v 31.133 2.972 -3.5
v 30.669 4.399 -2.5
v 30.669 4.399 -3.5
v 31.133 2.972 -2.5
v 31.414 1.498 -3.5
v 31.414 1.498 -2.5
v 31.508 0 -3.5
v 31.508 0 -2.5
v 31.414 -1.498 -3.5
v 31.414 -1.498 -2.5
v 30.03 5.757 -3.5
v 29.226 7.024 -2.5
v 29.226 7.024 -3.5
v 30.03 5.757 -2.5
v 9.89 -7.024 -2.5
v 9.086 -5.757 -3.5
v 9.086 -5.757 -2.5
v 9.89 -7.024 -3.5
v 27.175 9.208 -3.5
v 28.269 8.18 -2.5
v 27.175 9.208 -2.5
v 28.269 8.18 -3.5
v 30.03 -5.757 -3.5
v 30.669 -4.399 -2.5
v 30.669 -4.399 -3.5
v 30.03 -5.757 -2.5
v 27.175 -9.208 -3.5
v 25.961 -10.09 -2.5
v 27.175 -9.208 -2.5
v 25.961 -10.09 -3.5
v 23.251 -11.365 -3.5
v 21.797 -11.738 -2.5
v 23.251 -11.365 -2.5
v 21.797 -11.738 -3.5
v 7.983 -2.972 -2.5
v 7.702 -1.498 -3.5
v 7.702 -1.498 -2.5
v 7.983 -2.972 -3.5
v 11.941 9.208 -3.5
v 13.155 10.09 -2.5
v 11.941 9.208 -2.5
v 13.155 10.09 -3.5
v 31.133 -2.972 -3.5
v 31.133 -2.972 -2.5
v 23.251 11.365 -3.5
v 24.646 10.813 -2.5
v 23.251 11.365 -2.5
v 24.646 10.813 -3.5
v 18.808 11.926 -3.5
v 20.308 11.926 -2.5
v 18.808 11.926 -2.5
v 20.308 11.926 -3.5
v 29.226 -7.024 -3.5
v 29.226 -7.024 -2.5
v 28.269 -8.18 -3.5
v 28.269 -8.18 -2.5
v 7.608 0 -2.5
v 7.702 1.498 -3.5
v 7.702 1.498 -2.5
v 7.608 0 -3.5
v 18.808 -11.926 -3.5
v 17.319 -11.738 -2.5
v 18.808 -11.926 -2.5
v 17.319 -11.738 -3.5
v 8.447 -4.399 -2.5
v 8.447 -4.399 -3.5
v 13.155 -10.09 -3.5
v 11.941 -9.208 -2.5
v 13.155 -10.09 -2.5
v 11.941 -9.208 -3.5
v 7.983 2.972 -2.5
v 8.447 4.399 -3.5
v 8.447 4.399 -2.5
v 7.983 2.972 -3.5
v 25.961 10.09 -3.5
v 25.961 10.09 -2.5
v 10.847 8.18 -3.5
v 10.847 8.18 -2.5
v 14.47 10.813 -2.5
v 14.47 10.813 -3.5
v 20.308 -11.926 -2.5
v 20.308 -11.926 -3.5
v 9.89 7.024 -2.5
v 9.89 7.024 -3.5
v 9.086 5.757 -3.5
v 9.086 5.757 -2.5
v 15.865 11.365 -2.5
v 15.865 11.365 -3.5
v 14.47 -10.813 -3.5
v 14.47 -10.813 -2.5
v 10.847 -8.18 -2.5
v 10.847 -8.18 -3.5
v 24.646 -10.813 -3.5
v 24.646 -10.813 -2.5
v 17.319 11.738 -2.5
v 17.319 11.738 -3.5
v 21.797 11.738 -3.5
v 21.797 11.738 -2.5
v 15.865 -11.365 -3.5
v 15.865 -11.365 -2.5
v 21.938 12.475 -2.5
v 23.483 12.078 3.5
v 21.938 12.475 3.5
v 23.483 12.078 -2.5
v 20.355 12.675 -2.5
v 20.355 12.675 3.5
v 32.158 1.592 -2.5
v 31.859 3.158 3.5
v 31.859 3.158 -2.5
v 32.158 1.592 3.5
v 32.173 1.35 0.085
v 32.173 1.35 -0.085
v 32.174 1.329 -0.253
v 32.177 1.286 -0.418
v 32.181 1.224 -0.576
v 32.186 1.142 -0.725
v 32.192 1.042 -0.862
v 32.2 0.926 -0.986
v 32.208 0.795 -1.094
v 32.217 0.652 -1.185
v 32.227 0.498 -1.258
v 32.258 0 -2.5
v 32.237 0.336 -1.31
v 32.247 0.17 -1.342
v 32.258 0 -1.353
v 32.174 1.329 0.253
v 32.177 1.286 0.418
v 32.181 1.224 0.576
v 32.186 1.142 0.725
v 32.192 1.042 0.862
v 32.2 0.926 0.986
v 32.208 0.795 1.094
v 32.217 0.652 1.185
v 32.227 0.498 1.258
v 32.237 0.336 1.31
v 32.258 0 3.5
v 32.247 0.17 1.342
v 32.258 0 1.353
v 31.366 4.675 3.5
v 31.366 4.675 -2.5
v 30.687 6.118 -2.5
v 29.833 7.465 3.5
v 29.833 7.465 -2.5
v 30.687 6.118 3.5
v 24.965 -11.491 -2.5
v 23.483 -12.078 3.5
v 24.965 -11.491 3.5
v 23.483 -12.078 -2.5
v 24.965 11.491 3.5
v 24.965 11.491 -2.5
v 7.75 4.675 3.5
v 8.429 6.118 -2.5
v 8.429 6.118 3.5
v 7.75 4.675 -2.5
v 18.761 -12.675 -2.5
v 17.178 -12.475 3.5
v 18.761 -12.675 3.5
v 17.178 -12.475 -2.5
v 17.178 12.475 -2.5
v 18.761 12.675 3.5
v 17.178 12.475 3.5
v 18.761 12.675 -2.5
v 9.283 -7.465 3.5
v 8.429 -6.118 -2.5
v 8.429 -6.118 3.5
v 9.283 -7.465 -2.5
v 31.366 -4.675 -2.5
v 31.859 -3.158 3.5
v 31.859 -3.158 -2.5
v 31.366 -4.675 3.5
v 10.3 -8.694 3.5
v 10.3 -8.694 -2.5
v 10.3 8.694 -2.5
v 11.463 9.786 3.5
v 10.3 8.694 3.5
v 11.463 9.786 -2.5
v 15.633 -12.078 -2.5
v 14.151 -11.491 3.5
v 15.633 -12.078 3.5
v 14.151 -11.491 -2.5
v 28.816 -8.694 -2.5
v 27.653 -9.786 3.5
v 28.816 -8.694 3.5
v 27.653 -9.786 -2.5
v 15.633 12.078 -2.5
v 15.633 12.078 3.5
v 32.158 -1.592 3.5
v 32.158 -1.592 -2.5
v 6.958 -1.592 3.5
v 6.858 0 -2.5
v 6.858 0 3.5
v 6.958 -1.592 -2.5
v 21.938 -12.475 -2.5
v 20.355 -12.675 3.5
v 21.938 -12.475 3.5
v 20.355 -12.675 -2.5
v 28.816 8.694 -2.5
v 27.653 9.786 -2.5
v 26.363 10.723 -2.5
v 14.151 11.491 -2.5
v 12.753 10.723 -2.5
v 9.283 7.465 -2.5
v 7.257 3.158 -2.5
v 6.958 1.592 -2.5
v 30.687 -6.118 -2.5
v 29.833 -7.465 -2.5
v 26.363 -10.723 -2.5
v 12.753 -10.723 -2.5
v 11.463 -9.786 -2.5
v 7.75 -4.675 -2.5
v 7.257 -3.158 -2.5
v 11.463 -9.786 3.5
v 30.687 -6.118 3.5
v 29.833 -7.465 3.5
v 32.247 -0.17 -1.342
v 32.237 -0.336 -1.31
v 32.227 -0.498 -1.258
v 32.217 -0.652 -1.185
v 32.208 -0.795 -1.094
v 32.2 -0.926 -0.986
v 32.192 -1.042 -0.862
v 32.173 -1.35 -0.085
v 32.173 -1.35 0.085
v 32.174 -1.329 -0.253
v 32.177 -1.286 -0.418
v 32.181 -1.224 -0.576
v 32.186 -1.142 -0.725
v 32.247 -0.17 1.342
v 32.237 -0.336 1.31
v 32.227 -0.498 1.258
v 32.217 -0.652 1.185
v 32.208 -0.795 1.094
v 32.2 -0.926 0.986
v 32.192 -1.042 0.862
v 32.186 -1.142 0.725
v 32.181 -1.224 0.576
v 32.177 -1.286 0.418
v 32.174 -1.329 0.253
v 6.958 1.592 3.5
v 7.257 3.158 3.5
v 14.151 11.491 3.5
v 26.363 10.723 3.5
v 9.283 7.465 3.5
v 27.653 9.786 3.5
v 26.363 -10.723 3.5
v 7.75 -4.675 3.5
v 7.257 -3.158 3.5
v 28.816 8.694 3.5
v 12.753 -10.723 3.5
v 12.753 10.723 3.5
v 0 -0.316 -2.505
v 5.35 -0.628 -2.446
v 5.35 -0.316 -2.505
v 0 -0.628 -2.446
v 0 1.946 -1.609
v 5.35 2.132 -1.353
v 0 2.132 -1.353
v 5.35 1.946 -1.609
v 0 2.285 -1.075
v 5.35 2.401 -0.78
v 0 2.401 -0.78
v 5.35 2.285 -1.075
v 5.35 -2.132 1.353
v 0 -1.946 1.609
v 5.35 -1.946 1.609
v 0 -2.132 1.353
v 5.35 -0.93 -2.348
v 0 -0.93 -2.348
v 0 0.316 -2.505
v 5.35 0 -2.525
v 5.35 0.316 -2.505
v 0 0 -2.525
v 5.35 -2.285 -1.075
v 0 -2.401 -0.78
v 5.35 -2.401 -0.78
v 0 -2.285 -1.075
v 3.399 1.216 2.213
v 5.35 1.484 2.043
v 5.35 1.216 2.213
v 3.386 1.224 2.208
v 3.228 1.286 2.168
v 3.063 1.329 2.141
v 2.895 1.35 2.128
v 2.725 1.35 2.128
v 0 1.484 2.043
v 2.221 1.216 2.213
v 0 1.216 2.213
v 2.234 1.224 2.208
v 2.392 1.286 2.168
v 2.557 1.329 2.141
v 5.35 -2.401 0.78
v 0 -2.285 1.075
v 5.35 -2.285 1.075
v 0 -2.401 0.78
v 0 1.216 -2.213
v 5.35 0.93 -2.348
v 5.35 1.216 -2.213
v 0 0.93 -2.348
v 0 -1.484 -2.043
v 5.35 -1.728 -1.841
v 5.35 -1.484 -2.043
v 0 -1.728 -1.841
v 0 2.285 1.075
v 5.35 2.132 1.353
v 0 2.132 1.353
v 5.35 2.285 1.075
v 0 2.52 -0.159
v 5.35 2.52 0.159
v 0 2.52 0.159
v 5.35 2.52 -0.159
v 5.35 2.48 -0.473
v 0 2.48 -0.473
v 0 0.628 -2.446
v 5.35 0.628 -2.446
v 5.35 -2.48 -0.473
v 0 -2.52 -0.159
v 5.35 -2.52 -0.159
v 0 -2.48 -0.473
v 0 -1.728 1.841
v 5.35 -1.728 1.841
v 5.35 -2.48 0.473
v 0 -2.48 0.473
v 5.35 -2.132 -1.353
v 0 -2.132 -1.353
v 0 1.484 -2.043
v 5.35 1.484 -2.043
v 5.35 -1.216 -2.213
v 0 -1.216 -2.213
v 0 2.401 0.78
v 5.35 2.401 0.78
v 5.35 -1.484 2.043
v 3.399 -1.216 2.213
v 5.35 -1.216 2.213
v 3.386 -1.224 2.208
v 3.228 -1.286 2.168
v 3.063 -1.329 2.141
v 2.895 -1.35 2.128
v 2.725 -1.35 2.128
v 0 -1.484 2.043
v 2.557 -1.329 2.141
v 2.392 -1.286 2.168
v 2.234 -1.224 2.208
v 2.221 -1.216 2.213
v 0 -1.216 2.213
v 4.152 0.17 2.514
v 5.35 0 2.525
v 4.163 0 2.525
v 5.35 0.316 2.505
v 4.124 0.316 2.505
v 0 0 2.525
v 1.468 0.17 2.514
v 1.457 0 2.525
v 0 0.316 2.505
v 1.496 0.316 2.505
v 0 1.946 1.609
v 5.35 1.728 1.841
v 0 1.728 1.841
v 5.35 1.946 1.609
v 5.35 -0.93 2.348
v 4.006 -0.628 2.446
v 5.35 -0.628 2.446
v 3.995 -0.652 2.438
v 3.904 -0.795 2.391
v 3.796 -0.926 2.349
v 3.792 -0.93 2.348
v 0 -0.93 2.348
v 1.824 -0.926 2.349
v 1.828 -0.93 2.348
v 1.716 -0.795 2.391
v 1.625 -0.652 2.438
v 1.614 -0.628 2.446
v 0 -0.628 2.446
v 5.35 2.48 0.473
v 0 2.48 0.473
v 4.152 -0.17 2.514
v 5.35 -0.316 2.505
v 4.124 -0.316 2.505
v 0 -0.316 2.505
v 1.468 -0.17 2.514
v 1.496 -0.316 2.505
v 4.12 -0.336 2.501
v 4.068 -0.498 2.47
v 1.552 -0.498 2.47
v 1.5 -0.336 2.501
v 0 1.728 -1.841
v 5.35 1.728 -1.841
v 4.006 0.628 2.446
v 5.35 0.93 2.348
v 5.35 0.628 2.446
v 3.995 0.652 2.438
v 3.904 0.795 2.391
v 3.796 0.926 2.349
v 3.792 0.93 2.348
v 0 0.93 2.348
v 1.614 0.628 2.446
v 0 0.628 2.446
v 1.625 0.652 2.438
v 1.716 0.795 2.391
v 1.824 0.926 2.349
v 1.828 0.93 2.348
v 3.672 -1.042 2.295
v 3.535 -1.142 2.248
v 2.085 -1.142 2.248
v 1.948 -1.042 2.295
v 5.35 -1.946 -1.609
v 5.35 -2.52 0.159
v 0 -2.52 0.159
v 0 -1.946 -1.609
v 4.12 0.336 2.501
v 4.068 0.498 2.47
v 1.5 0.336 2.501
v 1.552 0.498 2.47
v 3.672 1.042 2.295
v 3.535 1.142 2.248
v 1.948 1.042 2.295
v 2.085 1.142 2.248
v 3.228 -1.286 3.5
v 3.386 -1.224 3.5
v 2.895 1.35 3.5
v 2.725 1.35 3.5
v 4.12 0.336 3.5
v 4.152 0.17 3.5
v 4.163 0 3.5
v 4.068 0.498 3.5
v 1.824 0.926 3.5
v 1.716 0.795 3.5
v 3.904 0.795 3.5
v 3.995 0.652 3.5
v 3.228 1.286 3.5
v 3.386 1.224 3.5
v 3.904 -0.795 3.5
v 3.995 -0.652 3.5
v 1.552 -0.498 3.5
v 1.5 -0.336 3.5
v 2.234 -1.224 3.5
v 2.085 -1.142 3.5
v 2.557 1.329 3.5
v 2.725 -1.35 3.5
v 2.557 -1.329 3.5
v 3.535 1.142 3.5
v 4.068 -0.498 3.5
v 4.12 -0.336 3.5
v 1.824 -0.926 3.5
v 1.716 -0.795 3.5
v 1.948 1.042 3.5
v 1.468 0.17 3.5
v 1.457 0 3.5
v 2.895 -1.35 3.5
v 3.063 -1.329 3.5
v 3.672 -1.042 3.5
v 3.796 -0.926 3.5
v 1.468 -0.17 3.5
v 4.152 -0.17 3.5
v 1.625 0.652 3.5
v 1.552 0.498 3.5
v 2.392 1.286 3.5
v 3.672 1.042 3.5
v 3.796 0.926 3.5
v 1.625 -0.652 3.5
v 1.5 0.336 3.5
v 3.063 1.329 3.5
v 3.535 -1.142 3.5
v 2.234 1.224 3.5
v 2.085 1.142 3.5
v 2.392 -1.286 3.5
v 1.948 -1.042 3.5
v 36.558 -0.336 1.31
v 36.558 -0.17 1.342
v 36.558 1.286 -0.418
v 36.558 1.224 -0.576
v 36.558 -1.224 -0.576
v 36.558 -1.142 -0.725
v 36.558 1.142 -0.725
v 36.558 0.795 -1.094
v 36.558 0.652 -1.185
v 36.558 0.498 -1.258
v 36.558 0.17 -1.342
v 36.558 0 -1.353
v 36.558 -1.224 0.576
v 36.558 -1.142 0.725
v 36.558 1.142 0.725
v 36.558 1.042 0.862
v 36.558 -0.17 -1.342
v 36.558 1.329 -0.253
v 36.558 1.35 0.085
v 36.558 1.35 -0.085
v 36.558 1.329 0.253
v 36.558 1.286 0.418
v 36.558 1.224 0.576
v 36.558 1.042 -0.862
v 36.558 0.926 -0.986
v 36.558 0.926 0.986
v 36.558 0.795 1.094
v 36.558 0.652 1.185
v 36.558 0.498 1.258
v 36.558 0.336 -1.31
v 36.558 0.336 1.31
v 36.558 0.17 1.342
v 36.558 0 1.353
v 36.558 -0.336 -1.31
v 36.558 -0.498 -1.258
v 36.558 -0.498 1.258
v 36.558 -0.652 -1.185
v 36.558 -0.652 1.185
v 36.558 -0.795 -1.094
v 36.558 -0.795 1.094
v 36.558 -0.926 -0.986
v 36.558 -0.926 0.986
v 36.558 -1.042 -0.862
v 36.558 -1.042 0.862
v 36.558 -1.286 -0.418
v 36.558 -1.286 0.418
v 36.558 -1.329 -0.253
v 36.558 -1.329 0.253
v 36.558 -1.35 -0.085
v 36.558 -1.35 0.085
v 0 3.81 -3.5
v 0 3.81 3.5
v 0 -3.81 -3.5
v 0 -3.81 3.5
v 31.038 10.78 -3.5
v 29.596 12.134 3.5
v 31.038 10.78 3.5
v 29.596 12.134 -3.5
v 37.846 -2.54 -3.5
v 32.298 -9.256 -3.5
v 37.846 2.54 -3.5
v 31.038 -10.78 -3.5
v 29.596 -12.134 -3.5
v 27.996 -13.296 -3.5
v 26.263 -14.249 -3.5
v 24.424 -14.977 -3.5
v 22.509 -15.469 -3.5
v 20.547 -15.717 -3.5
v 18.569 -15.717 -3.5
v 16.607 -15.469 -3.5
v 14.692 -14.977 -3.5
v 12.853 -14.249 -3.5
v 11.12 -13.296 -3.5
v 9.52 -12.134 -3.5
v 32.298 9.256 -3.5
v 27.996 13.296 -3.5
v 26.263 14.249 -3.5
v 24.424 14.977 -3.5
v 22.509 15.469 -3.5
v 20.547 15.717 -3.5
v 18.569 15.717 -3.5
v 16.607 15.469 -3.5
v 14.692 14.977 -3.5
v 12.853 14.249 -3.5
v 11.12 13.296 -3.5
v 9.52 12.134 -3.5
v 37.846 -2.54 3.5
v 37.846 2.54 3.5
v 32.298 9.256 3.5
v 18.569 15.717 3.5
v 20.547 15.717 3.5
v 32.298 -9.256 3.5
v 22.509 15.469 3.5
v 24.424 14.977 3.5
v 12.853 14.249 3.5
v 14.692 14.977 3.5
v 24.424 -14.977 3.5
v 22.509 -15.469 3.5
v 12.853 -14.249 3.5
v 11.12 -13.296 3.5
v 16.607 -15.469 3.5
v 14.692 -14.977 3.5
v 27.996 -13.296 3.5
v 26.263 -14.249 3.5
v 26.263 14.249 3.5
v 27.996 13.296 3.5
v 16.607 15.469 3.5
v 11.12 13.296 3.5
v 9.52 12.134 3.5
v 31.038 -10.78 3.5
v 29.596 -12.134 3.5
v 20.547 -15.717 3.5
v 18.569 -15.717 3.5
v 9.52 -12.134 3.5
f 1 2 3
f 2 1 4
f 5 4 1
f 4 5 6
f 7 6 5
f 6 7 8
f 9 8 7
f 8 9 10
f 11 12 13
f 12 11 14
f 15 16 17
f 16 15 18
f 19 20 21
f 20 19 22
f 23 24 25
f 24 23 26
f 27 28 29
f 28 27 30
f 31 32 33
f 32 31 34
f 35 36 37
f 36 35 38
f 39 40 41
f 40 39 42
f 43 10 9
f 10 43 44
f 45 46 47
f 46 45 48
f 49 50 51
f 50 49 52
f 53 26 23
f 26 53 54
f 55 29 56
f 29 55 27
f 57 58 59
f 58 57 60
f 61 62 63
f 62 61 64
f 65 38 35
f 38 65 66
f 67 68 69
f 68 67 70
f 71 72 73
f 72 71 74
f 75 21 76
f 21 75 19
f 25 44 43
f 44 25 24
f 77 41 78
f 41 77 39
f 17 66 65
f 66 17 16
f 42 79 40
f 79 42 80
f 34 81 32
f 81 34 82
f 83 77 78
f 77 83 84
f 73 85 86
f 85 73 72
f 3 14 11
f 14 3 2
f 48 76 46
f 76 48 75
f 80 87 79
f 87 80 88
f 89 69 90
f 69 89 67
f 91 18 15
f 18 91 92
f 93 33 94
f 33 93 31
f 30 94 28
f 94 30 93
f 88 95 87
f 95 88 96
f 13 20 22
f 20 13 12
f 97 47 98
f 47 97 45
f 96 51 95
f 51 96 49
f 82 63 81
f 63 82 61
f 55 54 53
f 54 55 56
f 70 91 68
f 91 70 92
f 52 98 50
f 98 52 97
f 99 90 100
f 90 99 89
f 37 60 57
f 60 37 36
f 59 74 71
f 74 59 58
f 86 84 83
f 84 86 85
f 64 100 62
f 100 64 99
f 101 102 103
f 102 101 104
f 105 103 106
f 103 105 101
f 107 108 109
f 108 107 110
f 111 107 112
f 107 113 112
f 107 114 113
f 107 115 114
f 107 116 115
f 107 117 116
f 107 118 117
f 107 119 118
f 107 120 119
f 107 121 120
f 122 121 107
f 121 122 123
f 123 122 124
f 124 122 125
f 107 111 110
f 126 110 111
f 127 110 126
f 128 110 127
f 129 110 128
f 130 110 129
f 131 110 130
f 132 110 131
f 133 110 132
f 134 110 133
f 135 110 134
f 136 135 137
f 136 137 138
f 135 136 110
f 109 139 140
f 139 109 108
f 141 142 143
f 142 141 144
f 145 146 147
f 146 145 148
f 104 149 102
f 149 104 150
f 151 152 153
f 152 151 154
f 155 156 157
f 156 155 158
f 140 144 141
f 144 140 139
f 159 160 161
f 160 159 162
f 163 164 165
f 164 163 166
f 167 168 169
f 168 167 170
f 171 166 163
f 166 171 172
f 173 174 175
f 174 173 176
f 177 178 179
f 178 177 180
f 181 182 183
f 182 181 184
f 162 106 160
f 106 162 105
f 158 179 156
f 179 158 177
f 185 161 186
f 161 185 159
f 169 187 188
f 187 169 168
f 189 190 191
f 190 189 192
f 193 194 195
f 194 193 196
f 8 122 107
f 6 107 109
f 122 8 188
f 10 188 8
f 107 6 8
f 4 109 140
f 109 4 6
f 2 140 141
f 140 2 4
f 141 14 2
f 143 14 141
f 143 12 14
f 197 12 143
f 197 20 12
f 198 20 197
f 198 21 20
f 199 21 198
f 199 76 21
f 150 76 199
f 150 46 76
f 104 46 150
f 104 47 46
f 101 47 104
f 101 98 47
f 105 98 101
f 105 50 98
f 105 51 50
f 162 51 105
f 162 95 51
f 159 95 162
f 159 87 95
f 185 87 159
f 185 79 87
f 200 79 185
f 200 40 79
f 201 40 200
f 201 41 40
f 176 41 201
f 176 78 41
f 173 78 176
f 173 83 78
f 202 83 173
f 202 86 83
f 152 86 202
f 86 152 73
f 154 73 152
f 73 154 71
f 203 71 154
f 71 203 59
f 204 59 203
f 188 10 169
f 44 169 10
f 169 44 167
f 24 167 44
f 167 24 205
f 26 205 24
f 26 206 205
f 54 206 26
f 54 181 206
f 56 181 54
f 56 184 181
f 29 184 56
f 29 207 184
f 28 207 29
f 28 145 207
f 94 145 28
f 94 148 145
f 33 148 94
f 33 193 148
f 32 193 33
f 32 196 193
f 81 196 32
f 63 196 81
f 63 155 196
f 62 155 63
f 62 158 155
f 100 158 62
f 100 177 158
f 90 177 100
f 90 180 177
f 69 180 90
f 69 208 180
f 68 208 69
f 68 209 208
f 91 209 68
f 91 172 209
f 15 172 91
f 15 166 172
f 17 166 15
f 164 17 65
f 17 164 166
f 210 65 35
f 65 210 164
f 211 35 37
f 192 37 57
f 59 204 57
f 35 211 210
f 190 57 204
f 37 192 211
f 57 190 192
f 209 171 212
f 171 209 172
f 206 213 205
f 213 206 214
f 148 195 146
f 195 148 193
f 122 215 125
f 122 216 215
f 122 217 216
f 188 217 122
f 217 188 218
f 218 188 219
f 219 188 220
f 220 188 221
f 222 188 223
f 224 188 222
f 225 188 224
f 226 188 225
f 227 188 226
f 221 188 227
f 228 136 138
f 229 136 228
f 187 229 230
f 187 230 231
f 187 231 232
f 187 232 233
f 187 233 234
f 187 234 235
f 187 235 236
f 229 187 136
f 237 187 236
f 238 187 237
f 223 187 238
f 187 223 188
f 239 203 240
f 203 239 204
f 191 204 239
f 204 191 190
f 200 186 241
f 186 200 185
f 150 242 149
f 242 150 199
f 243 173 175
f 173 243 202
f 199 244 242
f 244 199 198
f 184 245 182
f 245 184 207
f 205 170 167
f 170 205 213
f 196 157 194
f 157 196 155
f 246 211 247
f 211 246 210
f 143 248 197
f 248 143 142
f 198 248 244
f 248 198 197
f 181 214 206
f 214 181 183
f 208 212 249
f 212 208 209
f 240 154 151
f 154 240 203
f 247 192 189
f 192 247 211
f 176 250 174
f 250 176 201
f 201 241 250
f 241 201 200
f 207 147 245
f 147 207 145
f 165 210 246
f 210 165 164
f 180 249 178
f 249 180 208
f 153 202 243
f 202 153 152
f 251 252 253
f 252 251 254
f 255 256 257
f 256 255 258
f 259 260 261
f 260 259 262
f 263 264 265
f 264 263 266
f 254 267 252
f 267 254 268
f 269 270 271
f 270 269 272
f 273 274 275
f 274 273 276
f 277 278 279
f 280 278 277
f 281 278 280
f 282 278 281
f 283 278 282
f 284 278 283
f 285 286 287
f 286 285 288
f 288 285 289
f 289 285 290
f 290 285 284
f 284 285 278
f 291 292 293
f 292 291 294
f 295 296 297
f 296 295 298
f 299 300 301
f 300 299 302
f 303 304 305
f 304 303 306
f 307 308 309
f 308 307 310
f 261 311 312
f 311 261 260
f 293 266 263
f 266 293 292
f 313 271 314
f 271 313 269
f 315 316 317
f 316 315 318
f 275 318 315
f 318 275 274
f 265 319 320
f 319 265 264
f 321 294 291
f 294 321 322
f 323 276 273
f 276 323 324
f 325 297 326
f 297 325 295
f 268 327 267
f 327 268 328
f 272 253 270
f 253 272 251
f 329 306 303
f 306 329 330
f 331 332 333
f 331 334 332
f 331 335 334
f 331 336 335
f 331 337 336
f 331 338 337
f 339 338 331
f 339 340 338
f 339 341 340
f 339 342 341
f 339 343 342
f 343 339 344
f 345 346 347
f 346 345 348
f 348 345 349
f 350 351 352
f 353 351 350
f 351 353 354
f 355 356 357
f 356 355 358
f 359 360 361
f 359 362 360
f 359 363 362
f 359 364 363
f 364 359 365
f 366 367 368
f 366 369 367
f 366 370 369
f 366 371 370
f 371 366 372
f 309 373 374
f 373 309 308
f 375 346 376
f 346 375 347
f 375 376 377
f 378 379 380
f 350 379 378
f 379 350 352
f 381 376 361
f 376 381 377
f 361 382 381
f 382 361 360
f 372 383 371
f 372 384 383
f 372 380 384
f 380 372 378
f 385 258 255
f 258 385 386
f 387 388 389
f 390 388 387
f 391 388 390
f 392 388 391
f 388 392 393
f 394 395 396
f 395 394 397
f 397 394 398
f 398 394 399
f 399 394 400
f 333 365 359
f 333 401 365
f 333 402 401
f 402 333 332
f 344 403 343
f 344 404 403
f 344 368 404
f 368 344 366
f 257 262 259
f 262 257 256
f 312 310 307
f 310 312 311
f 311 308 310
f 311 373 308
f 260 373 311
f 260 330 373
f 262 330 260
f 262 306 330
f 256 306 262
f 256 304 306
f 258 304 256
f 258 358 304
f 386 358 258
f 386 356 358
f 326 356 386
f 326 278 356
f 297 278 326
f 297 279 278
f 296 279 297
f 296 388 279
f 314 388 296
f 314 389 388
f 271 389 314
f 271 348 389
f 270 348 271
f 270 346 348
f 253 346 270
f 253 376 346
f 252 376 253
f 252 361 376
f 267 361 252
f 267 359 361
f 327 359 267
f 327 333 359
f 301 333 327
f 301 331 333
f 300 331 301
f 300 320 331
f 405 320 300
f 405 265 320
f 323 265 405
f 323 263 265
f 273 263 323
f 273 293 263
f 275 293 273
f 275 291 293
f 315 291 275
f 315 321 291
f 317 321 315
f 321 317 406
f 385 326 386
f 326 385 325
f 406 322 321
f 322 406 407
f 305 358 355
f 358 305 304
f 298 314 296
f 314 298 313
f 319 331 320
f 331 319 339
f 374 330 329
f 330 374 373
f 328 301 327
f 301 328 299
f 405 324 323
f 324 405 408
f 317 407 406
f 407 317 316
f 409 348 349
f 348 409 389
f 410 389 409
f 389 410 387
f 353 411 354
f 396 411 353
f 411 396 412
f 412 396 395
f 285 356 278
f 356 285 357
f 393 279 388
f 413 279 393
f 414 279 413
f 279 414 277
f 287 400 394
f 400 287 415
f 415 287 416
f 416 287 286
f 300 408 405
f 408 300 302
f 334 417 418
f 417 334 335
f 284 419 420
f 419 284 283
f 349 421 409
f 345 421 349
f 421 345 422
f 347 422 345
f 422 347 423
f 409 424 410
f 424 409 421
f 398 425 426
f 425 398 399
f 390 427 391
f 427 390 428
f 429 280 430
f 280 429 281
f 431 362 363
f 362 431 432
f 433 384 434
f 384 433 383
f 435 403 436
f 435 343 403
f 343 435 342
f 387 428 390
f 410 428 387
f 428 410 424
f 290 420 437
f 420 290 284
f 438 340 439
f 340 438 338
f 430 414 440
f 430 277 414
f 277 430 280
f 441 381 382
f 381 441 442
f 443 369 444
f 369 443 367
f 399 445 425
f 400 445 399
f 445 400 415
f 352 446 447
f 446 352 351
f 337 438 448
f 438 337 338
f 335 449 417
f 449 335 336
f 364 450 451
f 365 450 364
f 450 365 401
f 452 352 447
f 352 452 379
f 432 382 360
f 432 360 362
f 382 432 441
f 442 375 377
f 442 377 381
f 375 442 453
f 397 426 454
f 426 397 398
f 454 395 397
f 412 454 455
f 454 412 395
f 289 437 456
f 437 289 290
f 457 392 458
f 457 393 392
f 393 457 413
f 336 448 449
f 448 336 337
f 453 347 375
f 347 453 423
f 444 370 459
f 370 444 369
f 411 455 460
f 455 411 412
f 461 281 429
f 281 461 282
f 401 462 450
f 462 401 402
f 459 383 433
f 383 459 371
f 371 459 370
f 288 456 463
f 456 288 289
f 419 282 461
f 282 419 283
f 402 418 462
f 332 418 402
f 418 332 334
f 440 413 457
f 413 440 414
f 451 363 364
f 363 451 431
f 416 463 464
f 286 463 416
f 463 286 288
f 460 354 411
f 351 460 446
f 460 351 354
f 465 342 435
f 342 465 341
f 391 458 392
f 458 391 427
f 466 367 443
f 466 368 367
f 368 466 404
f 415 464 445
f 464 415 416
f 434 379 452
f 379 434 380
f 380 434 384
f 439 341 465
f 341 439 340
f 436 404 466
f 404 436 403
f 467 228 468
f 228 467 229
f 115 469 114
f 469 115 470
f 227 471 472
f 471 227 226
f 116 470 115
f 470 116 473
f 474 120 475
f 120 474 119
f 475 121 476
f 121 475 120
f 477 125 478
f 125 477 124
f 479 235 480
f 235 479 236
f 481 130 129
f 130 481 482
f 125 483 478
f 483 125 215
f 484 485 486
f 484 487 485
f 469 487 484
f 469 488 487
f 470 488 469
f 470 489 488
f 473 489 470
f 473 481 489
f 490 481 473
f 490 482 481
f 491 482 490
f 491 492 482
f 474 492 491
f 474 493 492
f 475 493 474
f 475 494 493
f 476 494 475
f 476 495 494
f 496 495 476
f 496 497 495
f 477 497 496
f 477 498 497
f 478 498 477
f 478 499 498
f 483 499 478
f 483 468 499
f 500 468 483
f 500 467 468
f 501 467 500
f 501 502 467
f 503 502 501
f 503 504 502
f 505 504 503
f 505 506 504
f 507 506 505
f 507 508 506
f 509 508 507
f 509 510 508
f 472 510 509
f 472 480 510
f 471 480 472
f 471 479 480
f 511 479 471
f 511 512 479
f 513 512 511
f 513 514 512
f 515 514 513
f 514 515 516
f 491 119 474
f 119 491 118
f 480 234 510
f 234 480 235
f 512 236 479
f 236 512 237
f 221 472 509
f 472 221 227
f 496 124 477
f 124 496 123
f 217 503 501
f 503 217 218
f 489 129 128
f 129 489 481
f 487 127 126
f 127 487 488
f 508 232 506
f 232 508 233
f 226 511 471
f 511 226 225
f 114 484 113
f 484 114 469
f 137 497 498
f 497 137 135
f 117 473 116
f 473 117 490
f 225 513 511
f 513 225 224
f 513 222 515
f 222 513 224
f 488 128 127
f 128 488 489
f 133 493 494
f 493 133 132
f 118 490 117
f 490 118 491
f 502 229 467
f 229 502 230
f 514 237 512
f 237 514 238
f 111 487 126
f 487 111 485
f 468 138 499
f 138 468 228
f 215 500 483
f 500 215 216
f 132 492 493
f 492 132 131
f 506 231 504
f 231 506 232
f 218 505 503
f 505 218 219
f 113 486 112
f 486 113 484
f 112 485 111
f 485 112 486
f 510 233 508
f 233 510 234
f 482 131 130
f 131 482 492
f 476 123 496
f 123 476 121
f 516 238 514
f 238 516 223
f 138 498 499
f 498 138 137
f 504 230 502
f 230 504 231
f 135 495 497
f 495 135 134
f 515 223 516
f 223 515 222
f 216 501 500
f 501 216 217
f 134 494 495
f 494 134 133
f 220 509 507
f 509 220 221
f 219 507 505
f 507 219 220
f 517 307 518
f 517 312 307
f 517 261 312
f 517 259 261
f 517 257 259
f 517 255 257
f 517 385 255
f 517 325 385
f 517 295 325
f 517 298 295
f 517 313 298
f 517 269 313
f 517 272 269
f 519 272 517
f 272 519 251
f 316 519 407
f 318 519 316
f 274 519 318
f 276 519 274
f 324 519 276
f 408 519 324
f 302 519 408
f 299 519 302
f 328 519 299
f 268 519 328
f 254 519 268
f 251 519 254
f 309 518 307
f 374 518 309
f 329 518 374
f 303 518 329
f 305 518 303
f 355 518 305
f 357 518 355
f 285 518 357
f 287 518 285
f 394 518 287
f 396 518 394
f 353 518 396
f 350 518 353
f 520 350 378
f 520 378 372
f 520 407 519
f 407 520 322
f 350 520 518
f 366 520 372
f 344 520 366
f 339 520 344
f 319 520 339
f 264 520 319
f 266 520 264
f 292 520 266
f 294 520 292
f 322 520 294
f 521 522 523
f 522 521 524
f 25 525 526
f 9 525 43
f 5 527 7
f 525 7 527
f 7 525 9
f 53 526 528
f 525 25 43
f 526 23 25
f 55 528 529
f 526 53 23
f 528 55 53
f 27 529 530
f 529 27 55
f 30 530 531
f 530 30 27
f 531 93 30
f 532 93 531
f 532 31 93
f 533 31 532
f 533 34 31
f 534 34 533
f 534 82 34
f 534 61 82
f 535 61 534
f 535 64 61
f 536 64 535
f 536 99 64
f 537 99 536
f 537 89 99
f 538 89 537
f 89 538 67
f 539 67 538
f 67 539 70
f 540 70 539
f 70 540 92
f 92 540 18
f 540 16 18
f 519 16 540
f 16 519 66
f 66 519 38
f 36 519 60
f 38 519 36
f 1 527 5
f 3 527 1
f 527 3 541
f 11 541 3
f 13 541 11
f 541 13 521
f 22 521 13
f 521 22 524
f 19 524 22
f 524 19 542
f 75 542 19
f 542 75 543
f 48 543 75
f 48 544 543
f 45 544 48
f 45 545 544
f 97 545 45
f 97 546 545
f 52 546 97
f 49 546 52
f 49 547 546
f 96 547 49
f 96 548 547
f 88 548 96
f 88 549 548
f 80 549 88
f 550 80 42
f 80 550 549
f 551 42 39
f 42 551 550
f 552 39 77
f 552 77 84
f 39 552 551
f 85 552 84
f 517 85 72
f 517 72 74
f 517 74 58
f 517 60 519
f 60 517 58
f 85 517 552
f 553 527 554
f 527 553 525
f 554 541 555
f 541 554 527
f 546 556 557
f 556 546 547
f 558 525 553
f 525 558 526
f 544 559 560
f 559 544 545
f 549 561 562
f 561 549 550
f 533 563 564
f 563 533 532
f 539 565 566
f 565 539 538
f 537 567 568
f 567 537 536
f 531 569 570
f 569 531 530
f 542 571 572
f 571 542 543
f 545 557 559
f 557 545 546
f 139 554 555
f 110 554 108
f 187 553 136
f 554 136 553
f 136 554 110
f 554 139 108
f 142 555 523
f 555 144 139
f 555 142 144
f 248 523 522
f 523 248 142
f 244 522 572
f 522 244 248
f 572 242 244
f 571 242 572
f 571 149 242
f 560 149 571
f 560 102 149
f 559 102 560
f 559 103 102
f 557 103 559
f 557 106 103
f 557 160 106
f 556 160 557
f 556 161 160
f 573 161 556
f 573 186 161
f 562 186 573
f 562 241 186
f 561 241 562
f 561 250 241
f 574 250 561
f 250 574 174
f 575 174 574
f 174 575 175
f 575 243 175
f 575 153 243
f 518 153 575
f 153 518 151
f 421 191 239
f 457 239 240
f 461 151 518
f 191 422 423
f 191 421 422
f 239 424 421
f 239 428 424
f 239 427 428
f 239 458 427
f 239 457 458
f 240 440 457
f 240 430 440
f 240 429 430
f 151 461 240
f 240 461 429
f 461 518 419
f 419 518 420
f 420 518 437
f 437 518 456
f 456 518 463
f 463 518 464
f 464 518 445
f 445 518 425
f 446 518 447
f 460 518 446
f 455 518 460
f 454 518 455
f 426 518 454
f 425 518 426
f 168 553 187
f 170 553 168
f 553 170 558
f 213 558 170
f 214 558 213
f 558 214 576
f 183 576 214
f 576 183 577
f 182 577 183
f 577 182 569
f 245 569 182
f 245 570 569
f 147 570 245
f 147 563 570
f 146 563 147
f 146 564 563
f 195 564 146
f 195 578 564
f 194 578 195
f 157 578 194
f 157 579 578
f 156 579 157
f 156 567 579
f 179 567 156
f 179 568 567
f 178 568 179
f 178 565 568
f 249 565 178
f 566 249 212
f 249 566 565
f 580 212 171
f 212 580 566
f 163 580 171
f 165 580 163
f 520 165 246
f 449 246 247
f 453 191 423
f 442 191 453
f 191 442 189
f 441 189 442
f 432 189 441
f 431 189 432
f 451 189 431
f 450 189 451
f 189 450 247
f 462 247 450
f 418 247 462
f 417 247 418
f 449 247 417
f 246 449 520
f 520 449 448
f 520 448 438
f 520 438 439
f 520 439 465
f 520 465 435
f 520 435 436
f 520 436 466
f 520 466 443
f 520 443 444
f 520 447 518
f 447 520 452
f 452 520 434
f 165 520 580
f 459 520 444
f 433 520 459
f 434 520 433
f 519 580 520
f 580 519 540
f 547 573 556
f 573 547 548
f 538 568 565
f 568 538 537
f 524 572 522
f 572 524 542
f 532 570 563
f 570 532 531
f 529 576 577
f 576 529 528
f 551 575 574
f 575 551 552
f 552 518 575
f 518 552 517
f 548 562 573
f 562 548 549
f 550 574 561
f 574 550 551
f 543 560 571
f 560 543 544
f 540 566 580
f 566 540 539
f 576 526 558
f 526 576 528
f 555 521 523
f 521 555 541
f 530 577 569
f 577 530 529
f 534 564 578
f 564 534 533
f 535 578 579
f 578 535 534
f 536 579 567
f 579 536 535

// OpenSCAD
$fn=50;
inch = 25.4;

mt = 7;
d_s6 = .1065*inch;  // size 6 screw hole (before threading)

module circular_mirror() {
    linear_extrude(mt,center=true)
    hull(){
        circle(d=1.24*inch);
        translate([0.62*inch, 0,0])
        square([0.2*inch, 0.2*inch], center=true);        
        translate([-0.62*inch, 0,0])
        square([0.3*inch, 0.3*inch], center=true);        
    }
}

translate([(0.3 + 1.24)/2 * inch, 0])
difference(){
    circular_mirror();
    union(){
        // window lip
        cylinder(h=10, d=1*inch-1.5, center=true);
        // window clearance
        translate([0,0,-mt/2+1])
        cylinder(h=10, d=1*inch, center=false);
        // stepper shaft
        translate([-0.62*inch-1 - 0.15*inch,0,0])
        rotate([0,90,0])
        cylinder(h=0.25*inch, d=5.05);
        // shaft fastener hole (to be threaded)
        translate([-0.62*inch-1,0,0])
        cylinder(h=4.1, d=d_s6);
        //window fastener screw
        translate([12,0,0])
        rotate([0,90,0])
        cylinder(h=10, d=d_s6, center=true);
    }
}
